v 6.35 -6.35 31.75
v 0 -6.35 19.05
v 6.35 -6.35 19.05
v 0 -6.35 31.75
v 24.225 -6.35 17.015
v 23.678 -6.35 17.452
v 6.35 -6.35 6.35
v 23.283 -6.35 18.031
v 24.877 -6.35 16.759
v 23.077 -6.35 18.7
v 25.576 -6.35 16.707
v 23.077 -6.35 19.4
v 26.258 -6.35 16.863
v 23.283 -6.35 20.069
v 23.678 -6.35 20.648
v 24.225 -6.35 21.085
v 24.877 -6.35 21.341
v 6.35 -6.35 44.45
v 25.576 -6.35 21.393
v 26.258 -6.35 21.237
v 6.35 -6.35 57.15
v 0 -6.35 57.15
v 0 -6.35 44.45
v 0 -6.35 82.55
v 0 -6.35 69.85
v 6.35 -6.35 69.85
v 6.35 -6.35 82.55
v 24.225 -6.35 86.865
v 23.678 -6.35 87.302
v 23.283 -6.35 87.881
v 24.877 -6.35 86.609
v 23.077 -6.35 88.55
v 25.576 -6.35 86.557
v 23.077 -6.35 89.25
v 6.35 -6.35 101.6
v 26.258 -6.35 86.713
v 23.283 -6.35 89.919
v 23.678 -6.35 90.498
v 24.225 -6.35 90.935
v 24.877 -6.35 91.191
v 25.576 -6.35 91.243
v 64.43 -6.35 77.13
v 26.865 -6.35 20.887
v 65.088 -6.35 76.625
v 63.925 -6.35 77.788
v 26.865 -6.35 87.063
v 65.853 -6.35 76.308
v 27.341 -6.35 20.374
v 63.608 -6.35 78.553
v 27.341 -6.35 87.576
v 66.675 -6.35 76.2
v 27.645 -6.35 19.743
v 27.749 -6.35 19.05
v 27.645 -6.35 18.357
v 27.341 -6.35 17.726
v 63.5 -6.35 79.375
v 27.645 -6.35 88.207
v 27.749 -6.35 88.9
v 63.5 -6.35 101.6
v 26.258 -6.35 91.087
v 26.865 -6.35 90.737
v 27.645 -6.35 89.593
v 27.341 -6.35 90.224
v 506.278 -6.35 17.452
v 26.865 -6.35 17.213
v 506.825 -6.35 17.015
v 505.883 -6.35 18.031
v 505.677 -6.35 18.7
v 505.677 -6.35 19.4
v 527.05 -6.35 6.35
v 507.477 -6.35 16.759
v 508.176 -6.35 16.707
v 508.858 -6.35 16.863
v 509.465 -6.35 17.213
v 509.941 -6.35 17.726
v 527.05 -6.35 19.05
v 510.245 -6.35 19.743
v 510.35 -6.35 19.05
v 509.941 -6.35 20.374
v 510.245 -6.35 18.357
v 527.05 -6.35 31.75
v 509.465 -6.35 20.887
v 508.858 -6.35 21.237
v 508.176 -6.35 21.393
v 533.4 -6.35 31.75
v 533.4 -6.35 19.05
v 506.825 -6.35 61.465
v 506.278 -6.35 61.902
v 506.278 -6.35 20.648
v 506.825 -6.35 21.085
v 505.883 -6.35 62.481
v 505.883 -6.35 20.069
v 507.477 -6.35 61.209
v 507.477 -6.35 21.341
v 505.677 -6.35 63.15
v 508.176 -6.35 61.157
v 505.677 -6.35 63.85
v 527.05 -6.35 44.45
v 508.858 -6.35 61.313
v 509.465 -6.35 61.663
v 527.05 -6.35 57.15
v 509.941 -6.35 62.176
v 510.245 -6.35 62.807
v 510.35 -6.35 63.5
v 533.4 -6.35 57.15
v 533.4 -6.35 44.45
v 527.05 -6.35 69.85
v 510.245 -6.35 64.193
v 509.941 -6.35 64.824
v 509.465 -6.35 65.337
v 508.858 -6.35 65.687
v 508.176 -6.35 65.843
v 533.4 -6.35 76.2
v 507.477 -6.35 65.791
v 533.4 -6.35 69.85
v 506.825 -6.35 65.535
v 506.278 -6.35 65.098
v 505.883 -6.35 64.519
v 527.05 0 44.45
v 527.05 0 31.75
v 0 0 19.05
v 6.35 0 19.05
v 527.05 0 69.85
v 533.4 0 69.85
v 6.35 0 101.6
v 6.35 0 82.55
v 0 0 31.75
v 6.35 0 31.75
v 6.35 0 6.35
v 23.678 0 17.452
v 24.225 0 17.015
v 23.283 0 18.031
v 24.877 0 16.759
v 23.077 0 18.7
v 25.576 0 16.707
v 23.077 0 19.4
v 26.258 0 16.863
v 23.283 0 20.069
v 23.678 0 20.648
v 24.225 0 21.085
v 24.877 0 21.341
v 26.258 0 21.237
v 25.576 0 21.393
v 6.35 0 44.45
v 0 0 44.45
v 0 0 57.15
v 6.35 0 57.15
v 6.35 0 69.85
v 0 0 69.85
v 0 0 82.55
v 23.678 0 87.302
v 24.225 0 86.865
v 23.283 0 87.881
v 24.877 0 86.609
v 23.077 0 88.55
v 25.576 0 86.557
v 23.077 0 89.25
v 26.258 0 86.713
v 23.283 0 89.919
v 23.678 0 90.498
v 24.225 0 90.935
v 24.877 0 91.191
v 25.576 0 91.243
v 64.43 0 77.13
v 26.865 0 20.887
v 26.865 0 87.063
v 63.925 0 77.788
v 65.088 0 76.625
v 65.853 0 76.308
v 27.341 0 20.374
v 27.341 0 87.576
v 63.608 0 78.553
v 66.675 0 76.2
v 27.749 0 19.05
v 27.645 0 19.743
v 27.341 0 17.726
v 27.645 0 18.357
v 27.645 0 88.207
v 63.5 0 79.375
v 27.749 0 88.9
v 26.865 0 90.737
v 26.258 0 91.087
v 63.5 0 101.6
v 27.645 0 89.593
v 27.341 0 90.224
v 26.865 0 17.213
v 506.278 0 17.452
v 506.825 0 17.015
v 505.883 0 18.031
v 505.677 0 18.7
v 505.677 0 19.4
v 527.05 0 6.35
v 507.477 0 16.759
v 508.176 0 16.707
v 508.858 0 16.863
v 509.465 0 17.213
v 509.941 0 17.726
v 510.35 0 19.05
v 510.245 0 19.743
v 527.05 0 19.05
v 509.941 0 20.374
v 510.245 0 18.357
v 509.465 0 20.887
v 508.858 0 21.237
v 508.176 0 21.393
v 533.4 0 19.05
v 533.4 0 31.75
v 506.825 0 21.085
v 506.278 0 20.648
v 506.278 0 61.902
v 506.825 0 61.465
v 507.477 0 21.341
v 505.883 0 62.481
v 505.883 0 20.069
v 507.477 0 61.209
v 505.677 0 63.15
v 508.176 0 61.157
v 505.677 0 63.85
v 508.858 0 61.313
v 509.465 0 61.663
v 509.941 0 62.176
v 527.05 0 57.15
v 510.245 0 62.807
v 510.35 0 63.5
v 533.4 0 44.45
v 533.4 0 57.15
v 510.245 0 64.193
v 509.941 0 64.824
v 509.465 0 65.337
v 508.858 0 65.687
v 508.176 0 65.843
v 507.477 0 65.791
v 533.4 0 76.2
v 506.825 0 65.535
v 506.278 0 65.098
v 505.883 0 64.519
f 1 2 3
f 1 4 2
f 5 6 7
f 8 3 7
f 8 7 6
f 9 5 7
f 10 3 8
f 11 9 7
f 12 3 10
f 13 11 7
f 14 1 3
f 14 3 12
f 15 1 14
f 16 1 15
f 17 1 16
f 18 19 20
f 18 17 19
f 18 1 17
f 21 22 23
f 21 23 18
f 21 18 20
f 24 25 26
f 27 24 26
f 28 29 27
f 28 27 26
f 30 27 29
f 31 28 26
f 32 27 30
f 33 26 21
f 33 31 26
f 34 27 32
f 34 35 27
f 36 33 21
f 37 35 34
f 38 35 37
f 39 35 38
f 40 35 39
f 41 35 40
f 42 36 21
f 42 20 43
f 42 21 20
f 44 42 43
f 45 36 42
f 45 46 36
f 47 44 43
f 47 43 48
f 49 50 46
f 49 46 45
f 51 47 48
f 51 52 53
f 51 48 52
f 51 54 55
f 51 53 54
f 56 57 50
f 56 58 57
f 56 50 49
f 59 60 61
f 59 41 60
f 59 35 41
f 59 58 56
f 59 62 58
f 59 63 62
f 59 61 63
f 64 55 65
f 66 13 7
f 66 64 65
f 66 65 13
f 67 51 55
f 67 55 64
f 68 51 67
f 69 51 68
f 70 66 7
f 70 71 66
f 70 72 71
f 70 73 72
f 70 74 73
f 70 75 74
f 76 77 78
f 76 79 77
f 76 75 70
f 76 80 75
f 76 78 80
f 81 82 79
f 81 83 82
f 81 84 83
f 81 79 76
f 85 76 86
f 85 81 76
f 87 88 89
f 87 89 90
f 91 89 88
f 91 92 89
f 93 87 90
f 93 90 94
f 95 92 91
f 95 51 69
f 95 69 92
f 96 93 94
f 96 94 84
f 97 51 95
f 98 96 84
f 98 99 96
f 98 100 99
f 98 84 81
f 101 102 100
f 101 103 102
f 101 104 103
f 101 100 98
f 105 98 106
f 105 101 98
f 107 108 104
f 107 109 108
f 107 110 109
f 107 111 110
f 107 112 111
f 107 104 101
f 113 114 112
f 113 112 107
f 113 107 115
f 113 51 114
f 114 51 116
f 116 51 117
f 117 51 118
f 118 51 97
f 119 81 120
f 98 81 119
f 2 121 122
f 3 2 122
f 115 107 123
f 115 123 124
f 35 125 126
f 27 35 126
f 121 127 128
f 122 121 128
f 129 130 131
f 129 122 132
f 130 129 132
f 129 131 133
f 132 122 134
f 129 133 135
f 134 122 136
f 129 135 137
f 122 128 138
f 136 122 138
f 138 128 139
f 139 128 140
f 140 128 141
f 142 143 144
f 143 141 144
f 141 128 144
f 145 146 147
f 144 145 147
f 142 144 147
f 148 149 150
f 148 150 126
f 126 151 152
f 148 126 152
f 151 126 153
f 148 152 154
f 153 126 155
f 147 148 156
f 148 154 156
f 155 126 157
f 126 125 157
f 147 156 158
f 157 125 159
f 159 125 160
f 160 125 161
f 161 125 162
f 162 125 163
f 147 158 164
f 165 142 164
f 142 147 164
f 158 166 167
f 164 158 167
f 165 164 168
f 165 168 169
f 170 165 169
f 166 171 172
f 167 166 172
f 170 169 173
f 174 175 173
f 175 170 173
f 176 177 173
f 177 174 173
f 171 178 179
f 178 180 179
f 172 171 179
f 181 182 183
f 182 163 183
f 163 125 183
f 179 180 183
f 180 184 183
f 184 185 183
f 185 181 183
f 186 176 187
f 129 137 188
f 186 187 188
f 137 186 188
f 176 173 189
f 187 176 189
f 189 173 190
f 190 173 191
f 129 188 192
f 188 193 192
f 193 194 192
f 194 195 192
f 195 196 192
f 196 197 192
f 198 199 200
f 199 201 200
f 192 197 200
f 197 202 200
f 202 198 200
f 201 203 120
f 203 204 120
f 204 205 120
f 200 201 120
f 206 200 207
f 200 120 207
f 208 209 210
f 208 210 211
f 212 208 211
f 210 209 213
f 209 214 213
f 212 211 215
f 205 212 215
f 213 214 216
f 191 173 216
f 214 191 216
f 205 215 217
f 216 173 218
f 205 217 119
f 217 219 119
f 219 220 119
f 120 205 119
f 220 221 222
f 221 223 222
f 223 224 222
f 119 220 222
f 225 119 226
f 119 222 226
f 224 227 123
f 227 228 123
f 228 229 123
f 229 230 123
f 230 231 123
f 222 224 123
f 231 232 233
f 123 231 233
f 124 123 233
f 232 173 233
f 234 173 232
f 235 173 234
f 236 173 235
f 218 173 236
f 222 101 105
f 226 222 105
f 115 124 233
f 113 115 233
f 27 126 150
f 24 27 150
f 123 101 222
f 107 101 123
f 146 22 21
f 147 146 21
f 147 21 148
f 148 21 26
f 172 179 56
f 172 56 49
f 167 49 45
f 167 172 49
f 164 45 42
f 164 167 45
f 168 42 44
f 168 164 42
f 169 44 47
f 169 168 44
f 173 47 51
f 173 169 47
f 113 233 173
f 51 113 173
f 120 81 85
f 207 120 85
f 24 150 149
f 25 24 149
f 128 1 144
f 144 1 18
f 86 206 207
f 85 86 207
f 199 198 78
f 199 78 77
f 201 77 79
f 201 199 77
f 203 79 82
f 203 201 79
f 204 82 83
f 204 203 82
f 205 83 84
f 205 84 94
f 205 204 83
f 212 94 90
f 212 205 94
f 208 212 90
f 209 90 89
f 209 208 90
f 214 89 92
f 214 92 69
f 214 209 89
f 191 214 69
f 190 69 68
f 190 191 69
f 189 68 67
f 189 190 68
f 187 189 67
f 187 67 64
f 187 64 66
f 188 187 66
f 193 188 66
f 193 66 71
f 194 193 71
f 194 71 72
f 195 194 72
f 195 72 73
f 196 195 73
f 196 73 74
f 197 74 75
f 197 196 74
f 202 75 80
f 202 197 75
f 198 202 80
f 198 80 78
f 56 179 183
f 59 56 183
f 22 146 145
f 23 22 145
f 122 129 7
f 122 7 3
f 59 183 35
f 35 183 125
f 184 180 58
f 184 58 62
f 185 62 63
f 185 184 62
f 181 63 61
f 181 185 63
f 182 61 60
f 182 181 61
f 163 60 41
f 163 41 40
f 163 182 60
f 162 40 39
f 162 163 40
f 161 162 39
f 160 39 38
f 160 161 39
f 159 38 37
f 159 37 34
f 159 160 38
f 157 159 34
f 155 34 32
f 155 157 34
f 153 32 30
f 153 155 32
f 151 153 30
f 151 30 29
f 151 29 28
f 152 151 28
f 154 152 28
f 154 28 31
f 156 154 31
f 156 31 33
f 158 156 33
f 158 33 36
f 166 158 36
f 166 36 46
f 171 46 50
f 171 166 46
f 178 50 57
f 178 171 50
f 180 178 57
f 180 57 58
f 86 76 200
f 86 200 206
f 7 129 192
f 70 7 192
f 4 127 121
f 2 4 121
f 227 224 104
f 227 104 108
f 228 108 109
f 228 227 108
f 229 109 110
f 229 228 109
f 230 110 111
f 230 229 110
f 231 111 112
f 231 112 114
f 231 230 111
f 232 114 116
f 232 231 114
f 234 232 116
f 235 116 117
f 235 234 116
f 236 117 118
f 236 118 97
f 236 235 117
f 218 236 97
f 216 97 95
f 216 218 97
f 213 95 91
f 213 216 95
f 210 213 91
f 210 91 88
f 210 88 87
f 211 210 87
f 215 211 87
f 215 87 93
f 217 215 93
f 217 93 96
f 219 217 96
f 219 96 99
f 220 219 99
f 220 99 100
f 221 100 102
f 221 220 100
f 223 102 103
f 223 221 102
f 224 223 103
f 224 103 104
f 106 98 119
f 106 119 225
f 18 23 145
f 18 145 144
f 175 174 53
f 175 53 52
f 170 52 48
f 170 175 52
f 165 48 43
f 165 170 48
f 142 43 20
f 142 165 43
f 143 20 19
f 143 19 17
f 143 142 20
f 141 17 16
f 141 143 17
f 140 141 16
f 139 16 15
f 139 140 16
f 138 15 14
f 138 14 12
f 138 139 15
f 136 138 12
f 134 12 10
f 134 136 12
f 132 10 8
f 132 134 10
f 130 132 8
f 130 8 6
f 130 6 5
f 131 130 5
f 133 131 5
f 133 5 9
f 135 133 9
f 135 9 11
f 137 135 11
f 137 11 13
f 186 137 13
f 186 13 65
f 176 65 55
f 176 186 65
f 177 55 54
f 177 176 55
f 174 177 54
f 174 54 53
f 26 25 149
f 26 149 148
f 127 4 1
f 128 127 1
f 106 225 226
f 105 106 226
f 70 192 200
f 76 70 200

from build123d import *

# Parameters (mm, degrees)
SKETCH006_R            = 2.3495
PAD006_DEPTH           = 6.35
SKETCH007_W            = 6.35
SKETCH007_H            = 12.7
POCKET002_DEPTH        = 0.001
POCKET002_DEPTH_BACK   = 6.351
LINEARPATTERN002_COUNT = 3
LINEARPATTERN002_PITCH = 25.4
SKETCH009_W            = 6.35
SKETCH009_H            = 12.7
POCKET003_DEPTH        = 0.001
POCKET003_DEPTH_BACK   = 6.351
LINEARPATTERN003_COUNT = 3
LINEARPATTERN003_PITCH = 25.4


with BuildPart() as part:
    # Sketch006 → Pad006 (new body)
    with BuildSketch(Plane.XZ):
        with BuildLine():
            Line((533.4, 6.35), (533.4, 76.2))
            Line((533.4, 76.2), (66.675, 76.2))
            ThreePointArc((63.5, 79.375), (64.429936, 77.129936), (66.675, 76.2))
            Line((63.5, 79.375), (63.5, 101.6))
            Line((63.5, 101.6), (6.35, 101.6))
            Line((6.35, 101.6), (6.35, 82.55))
            Line((6.35, 82.55), (0, 82.55))
            Line((0, 82.55), (0, 6.35))
            Line((0, 6.35), (533.4, 6.35))
        make_face()
        with Locations((508, 63.5)):
            Circle(SKETCH006_R, mode=Mode.SUBTRACT)
        with Locations((508, 19.05)):
            Circle(SKETCH006_R, mode=Mode.SUBTRACT)
        with Locations((25.4, 19.05)):
            Circle(SKETCH006_R, mode=Mode.SUBTRACT)
        with Locations((25.4, 88.9)):
            Circle(SKETCH006_R, mode=Mode.SUBTRACT)
    extrude(amount=PAD006_DEPTH)

    # Sketch007 → Pocket002 (cut, two sides)
    with BuildSketch(Plane.XZ) as pocket002_sk:
        with Locations((3.175, 12.7)):
            Rectangle(SKETCH007_W, SKETCH007_H)
    pocket002 = extrude(amount=-POCKET002_DEPTH, mode=Mode.SUBTRACT) + extrude(pocket002_sk.sketch, amount=POCKET002_DEPTH_BACK, mode=Mode.SUBTRACT)

    # LinearPattern002: Pocket002 ×3
    with Locations(*[(0, 0, i * LINEARPATTERN002_PITCH) for i in range(1, LINEARPATTERN002_COUNT)]):
        add(pocket002, mode=Mode.SUBTRACT)

    # Sketch009 → Pocket003 (cut, two sides)
    with BuildSketch(Plane.XZ) as pocket003_sk:
        with Locations((530.225, 12.7)):
            Rectangle(SKETCH009_W, SKETCH009_H)
    pocket003 = extrude(amount=-POCKET003_DEPTH, mode=Mode.SUBTRACT) + extrude(pocket003_sk.sketch, amount=POCKET003_DEPTH_BACK, mode=Mode.SUBTRACT)

    # LinearPattern003: Pocket003 ×3
    with Locations(*[(0, 0, i * LINEARPATTERN003_PITCH) for i in range(1, LINEARPATTERN003_COUNT)]):
        add(pocket003, mode=Mode.SUBTRACT)


solid = part.part
